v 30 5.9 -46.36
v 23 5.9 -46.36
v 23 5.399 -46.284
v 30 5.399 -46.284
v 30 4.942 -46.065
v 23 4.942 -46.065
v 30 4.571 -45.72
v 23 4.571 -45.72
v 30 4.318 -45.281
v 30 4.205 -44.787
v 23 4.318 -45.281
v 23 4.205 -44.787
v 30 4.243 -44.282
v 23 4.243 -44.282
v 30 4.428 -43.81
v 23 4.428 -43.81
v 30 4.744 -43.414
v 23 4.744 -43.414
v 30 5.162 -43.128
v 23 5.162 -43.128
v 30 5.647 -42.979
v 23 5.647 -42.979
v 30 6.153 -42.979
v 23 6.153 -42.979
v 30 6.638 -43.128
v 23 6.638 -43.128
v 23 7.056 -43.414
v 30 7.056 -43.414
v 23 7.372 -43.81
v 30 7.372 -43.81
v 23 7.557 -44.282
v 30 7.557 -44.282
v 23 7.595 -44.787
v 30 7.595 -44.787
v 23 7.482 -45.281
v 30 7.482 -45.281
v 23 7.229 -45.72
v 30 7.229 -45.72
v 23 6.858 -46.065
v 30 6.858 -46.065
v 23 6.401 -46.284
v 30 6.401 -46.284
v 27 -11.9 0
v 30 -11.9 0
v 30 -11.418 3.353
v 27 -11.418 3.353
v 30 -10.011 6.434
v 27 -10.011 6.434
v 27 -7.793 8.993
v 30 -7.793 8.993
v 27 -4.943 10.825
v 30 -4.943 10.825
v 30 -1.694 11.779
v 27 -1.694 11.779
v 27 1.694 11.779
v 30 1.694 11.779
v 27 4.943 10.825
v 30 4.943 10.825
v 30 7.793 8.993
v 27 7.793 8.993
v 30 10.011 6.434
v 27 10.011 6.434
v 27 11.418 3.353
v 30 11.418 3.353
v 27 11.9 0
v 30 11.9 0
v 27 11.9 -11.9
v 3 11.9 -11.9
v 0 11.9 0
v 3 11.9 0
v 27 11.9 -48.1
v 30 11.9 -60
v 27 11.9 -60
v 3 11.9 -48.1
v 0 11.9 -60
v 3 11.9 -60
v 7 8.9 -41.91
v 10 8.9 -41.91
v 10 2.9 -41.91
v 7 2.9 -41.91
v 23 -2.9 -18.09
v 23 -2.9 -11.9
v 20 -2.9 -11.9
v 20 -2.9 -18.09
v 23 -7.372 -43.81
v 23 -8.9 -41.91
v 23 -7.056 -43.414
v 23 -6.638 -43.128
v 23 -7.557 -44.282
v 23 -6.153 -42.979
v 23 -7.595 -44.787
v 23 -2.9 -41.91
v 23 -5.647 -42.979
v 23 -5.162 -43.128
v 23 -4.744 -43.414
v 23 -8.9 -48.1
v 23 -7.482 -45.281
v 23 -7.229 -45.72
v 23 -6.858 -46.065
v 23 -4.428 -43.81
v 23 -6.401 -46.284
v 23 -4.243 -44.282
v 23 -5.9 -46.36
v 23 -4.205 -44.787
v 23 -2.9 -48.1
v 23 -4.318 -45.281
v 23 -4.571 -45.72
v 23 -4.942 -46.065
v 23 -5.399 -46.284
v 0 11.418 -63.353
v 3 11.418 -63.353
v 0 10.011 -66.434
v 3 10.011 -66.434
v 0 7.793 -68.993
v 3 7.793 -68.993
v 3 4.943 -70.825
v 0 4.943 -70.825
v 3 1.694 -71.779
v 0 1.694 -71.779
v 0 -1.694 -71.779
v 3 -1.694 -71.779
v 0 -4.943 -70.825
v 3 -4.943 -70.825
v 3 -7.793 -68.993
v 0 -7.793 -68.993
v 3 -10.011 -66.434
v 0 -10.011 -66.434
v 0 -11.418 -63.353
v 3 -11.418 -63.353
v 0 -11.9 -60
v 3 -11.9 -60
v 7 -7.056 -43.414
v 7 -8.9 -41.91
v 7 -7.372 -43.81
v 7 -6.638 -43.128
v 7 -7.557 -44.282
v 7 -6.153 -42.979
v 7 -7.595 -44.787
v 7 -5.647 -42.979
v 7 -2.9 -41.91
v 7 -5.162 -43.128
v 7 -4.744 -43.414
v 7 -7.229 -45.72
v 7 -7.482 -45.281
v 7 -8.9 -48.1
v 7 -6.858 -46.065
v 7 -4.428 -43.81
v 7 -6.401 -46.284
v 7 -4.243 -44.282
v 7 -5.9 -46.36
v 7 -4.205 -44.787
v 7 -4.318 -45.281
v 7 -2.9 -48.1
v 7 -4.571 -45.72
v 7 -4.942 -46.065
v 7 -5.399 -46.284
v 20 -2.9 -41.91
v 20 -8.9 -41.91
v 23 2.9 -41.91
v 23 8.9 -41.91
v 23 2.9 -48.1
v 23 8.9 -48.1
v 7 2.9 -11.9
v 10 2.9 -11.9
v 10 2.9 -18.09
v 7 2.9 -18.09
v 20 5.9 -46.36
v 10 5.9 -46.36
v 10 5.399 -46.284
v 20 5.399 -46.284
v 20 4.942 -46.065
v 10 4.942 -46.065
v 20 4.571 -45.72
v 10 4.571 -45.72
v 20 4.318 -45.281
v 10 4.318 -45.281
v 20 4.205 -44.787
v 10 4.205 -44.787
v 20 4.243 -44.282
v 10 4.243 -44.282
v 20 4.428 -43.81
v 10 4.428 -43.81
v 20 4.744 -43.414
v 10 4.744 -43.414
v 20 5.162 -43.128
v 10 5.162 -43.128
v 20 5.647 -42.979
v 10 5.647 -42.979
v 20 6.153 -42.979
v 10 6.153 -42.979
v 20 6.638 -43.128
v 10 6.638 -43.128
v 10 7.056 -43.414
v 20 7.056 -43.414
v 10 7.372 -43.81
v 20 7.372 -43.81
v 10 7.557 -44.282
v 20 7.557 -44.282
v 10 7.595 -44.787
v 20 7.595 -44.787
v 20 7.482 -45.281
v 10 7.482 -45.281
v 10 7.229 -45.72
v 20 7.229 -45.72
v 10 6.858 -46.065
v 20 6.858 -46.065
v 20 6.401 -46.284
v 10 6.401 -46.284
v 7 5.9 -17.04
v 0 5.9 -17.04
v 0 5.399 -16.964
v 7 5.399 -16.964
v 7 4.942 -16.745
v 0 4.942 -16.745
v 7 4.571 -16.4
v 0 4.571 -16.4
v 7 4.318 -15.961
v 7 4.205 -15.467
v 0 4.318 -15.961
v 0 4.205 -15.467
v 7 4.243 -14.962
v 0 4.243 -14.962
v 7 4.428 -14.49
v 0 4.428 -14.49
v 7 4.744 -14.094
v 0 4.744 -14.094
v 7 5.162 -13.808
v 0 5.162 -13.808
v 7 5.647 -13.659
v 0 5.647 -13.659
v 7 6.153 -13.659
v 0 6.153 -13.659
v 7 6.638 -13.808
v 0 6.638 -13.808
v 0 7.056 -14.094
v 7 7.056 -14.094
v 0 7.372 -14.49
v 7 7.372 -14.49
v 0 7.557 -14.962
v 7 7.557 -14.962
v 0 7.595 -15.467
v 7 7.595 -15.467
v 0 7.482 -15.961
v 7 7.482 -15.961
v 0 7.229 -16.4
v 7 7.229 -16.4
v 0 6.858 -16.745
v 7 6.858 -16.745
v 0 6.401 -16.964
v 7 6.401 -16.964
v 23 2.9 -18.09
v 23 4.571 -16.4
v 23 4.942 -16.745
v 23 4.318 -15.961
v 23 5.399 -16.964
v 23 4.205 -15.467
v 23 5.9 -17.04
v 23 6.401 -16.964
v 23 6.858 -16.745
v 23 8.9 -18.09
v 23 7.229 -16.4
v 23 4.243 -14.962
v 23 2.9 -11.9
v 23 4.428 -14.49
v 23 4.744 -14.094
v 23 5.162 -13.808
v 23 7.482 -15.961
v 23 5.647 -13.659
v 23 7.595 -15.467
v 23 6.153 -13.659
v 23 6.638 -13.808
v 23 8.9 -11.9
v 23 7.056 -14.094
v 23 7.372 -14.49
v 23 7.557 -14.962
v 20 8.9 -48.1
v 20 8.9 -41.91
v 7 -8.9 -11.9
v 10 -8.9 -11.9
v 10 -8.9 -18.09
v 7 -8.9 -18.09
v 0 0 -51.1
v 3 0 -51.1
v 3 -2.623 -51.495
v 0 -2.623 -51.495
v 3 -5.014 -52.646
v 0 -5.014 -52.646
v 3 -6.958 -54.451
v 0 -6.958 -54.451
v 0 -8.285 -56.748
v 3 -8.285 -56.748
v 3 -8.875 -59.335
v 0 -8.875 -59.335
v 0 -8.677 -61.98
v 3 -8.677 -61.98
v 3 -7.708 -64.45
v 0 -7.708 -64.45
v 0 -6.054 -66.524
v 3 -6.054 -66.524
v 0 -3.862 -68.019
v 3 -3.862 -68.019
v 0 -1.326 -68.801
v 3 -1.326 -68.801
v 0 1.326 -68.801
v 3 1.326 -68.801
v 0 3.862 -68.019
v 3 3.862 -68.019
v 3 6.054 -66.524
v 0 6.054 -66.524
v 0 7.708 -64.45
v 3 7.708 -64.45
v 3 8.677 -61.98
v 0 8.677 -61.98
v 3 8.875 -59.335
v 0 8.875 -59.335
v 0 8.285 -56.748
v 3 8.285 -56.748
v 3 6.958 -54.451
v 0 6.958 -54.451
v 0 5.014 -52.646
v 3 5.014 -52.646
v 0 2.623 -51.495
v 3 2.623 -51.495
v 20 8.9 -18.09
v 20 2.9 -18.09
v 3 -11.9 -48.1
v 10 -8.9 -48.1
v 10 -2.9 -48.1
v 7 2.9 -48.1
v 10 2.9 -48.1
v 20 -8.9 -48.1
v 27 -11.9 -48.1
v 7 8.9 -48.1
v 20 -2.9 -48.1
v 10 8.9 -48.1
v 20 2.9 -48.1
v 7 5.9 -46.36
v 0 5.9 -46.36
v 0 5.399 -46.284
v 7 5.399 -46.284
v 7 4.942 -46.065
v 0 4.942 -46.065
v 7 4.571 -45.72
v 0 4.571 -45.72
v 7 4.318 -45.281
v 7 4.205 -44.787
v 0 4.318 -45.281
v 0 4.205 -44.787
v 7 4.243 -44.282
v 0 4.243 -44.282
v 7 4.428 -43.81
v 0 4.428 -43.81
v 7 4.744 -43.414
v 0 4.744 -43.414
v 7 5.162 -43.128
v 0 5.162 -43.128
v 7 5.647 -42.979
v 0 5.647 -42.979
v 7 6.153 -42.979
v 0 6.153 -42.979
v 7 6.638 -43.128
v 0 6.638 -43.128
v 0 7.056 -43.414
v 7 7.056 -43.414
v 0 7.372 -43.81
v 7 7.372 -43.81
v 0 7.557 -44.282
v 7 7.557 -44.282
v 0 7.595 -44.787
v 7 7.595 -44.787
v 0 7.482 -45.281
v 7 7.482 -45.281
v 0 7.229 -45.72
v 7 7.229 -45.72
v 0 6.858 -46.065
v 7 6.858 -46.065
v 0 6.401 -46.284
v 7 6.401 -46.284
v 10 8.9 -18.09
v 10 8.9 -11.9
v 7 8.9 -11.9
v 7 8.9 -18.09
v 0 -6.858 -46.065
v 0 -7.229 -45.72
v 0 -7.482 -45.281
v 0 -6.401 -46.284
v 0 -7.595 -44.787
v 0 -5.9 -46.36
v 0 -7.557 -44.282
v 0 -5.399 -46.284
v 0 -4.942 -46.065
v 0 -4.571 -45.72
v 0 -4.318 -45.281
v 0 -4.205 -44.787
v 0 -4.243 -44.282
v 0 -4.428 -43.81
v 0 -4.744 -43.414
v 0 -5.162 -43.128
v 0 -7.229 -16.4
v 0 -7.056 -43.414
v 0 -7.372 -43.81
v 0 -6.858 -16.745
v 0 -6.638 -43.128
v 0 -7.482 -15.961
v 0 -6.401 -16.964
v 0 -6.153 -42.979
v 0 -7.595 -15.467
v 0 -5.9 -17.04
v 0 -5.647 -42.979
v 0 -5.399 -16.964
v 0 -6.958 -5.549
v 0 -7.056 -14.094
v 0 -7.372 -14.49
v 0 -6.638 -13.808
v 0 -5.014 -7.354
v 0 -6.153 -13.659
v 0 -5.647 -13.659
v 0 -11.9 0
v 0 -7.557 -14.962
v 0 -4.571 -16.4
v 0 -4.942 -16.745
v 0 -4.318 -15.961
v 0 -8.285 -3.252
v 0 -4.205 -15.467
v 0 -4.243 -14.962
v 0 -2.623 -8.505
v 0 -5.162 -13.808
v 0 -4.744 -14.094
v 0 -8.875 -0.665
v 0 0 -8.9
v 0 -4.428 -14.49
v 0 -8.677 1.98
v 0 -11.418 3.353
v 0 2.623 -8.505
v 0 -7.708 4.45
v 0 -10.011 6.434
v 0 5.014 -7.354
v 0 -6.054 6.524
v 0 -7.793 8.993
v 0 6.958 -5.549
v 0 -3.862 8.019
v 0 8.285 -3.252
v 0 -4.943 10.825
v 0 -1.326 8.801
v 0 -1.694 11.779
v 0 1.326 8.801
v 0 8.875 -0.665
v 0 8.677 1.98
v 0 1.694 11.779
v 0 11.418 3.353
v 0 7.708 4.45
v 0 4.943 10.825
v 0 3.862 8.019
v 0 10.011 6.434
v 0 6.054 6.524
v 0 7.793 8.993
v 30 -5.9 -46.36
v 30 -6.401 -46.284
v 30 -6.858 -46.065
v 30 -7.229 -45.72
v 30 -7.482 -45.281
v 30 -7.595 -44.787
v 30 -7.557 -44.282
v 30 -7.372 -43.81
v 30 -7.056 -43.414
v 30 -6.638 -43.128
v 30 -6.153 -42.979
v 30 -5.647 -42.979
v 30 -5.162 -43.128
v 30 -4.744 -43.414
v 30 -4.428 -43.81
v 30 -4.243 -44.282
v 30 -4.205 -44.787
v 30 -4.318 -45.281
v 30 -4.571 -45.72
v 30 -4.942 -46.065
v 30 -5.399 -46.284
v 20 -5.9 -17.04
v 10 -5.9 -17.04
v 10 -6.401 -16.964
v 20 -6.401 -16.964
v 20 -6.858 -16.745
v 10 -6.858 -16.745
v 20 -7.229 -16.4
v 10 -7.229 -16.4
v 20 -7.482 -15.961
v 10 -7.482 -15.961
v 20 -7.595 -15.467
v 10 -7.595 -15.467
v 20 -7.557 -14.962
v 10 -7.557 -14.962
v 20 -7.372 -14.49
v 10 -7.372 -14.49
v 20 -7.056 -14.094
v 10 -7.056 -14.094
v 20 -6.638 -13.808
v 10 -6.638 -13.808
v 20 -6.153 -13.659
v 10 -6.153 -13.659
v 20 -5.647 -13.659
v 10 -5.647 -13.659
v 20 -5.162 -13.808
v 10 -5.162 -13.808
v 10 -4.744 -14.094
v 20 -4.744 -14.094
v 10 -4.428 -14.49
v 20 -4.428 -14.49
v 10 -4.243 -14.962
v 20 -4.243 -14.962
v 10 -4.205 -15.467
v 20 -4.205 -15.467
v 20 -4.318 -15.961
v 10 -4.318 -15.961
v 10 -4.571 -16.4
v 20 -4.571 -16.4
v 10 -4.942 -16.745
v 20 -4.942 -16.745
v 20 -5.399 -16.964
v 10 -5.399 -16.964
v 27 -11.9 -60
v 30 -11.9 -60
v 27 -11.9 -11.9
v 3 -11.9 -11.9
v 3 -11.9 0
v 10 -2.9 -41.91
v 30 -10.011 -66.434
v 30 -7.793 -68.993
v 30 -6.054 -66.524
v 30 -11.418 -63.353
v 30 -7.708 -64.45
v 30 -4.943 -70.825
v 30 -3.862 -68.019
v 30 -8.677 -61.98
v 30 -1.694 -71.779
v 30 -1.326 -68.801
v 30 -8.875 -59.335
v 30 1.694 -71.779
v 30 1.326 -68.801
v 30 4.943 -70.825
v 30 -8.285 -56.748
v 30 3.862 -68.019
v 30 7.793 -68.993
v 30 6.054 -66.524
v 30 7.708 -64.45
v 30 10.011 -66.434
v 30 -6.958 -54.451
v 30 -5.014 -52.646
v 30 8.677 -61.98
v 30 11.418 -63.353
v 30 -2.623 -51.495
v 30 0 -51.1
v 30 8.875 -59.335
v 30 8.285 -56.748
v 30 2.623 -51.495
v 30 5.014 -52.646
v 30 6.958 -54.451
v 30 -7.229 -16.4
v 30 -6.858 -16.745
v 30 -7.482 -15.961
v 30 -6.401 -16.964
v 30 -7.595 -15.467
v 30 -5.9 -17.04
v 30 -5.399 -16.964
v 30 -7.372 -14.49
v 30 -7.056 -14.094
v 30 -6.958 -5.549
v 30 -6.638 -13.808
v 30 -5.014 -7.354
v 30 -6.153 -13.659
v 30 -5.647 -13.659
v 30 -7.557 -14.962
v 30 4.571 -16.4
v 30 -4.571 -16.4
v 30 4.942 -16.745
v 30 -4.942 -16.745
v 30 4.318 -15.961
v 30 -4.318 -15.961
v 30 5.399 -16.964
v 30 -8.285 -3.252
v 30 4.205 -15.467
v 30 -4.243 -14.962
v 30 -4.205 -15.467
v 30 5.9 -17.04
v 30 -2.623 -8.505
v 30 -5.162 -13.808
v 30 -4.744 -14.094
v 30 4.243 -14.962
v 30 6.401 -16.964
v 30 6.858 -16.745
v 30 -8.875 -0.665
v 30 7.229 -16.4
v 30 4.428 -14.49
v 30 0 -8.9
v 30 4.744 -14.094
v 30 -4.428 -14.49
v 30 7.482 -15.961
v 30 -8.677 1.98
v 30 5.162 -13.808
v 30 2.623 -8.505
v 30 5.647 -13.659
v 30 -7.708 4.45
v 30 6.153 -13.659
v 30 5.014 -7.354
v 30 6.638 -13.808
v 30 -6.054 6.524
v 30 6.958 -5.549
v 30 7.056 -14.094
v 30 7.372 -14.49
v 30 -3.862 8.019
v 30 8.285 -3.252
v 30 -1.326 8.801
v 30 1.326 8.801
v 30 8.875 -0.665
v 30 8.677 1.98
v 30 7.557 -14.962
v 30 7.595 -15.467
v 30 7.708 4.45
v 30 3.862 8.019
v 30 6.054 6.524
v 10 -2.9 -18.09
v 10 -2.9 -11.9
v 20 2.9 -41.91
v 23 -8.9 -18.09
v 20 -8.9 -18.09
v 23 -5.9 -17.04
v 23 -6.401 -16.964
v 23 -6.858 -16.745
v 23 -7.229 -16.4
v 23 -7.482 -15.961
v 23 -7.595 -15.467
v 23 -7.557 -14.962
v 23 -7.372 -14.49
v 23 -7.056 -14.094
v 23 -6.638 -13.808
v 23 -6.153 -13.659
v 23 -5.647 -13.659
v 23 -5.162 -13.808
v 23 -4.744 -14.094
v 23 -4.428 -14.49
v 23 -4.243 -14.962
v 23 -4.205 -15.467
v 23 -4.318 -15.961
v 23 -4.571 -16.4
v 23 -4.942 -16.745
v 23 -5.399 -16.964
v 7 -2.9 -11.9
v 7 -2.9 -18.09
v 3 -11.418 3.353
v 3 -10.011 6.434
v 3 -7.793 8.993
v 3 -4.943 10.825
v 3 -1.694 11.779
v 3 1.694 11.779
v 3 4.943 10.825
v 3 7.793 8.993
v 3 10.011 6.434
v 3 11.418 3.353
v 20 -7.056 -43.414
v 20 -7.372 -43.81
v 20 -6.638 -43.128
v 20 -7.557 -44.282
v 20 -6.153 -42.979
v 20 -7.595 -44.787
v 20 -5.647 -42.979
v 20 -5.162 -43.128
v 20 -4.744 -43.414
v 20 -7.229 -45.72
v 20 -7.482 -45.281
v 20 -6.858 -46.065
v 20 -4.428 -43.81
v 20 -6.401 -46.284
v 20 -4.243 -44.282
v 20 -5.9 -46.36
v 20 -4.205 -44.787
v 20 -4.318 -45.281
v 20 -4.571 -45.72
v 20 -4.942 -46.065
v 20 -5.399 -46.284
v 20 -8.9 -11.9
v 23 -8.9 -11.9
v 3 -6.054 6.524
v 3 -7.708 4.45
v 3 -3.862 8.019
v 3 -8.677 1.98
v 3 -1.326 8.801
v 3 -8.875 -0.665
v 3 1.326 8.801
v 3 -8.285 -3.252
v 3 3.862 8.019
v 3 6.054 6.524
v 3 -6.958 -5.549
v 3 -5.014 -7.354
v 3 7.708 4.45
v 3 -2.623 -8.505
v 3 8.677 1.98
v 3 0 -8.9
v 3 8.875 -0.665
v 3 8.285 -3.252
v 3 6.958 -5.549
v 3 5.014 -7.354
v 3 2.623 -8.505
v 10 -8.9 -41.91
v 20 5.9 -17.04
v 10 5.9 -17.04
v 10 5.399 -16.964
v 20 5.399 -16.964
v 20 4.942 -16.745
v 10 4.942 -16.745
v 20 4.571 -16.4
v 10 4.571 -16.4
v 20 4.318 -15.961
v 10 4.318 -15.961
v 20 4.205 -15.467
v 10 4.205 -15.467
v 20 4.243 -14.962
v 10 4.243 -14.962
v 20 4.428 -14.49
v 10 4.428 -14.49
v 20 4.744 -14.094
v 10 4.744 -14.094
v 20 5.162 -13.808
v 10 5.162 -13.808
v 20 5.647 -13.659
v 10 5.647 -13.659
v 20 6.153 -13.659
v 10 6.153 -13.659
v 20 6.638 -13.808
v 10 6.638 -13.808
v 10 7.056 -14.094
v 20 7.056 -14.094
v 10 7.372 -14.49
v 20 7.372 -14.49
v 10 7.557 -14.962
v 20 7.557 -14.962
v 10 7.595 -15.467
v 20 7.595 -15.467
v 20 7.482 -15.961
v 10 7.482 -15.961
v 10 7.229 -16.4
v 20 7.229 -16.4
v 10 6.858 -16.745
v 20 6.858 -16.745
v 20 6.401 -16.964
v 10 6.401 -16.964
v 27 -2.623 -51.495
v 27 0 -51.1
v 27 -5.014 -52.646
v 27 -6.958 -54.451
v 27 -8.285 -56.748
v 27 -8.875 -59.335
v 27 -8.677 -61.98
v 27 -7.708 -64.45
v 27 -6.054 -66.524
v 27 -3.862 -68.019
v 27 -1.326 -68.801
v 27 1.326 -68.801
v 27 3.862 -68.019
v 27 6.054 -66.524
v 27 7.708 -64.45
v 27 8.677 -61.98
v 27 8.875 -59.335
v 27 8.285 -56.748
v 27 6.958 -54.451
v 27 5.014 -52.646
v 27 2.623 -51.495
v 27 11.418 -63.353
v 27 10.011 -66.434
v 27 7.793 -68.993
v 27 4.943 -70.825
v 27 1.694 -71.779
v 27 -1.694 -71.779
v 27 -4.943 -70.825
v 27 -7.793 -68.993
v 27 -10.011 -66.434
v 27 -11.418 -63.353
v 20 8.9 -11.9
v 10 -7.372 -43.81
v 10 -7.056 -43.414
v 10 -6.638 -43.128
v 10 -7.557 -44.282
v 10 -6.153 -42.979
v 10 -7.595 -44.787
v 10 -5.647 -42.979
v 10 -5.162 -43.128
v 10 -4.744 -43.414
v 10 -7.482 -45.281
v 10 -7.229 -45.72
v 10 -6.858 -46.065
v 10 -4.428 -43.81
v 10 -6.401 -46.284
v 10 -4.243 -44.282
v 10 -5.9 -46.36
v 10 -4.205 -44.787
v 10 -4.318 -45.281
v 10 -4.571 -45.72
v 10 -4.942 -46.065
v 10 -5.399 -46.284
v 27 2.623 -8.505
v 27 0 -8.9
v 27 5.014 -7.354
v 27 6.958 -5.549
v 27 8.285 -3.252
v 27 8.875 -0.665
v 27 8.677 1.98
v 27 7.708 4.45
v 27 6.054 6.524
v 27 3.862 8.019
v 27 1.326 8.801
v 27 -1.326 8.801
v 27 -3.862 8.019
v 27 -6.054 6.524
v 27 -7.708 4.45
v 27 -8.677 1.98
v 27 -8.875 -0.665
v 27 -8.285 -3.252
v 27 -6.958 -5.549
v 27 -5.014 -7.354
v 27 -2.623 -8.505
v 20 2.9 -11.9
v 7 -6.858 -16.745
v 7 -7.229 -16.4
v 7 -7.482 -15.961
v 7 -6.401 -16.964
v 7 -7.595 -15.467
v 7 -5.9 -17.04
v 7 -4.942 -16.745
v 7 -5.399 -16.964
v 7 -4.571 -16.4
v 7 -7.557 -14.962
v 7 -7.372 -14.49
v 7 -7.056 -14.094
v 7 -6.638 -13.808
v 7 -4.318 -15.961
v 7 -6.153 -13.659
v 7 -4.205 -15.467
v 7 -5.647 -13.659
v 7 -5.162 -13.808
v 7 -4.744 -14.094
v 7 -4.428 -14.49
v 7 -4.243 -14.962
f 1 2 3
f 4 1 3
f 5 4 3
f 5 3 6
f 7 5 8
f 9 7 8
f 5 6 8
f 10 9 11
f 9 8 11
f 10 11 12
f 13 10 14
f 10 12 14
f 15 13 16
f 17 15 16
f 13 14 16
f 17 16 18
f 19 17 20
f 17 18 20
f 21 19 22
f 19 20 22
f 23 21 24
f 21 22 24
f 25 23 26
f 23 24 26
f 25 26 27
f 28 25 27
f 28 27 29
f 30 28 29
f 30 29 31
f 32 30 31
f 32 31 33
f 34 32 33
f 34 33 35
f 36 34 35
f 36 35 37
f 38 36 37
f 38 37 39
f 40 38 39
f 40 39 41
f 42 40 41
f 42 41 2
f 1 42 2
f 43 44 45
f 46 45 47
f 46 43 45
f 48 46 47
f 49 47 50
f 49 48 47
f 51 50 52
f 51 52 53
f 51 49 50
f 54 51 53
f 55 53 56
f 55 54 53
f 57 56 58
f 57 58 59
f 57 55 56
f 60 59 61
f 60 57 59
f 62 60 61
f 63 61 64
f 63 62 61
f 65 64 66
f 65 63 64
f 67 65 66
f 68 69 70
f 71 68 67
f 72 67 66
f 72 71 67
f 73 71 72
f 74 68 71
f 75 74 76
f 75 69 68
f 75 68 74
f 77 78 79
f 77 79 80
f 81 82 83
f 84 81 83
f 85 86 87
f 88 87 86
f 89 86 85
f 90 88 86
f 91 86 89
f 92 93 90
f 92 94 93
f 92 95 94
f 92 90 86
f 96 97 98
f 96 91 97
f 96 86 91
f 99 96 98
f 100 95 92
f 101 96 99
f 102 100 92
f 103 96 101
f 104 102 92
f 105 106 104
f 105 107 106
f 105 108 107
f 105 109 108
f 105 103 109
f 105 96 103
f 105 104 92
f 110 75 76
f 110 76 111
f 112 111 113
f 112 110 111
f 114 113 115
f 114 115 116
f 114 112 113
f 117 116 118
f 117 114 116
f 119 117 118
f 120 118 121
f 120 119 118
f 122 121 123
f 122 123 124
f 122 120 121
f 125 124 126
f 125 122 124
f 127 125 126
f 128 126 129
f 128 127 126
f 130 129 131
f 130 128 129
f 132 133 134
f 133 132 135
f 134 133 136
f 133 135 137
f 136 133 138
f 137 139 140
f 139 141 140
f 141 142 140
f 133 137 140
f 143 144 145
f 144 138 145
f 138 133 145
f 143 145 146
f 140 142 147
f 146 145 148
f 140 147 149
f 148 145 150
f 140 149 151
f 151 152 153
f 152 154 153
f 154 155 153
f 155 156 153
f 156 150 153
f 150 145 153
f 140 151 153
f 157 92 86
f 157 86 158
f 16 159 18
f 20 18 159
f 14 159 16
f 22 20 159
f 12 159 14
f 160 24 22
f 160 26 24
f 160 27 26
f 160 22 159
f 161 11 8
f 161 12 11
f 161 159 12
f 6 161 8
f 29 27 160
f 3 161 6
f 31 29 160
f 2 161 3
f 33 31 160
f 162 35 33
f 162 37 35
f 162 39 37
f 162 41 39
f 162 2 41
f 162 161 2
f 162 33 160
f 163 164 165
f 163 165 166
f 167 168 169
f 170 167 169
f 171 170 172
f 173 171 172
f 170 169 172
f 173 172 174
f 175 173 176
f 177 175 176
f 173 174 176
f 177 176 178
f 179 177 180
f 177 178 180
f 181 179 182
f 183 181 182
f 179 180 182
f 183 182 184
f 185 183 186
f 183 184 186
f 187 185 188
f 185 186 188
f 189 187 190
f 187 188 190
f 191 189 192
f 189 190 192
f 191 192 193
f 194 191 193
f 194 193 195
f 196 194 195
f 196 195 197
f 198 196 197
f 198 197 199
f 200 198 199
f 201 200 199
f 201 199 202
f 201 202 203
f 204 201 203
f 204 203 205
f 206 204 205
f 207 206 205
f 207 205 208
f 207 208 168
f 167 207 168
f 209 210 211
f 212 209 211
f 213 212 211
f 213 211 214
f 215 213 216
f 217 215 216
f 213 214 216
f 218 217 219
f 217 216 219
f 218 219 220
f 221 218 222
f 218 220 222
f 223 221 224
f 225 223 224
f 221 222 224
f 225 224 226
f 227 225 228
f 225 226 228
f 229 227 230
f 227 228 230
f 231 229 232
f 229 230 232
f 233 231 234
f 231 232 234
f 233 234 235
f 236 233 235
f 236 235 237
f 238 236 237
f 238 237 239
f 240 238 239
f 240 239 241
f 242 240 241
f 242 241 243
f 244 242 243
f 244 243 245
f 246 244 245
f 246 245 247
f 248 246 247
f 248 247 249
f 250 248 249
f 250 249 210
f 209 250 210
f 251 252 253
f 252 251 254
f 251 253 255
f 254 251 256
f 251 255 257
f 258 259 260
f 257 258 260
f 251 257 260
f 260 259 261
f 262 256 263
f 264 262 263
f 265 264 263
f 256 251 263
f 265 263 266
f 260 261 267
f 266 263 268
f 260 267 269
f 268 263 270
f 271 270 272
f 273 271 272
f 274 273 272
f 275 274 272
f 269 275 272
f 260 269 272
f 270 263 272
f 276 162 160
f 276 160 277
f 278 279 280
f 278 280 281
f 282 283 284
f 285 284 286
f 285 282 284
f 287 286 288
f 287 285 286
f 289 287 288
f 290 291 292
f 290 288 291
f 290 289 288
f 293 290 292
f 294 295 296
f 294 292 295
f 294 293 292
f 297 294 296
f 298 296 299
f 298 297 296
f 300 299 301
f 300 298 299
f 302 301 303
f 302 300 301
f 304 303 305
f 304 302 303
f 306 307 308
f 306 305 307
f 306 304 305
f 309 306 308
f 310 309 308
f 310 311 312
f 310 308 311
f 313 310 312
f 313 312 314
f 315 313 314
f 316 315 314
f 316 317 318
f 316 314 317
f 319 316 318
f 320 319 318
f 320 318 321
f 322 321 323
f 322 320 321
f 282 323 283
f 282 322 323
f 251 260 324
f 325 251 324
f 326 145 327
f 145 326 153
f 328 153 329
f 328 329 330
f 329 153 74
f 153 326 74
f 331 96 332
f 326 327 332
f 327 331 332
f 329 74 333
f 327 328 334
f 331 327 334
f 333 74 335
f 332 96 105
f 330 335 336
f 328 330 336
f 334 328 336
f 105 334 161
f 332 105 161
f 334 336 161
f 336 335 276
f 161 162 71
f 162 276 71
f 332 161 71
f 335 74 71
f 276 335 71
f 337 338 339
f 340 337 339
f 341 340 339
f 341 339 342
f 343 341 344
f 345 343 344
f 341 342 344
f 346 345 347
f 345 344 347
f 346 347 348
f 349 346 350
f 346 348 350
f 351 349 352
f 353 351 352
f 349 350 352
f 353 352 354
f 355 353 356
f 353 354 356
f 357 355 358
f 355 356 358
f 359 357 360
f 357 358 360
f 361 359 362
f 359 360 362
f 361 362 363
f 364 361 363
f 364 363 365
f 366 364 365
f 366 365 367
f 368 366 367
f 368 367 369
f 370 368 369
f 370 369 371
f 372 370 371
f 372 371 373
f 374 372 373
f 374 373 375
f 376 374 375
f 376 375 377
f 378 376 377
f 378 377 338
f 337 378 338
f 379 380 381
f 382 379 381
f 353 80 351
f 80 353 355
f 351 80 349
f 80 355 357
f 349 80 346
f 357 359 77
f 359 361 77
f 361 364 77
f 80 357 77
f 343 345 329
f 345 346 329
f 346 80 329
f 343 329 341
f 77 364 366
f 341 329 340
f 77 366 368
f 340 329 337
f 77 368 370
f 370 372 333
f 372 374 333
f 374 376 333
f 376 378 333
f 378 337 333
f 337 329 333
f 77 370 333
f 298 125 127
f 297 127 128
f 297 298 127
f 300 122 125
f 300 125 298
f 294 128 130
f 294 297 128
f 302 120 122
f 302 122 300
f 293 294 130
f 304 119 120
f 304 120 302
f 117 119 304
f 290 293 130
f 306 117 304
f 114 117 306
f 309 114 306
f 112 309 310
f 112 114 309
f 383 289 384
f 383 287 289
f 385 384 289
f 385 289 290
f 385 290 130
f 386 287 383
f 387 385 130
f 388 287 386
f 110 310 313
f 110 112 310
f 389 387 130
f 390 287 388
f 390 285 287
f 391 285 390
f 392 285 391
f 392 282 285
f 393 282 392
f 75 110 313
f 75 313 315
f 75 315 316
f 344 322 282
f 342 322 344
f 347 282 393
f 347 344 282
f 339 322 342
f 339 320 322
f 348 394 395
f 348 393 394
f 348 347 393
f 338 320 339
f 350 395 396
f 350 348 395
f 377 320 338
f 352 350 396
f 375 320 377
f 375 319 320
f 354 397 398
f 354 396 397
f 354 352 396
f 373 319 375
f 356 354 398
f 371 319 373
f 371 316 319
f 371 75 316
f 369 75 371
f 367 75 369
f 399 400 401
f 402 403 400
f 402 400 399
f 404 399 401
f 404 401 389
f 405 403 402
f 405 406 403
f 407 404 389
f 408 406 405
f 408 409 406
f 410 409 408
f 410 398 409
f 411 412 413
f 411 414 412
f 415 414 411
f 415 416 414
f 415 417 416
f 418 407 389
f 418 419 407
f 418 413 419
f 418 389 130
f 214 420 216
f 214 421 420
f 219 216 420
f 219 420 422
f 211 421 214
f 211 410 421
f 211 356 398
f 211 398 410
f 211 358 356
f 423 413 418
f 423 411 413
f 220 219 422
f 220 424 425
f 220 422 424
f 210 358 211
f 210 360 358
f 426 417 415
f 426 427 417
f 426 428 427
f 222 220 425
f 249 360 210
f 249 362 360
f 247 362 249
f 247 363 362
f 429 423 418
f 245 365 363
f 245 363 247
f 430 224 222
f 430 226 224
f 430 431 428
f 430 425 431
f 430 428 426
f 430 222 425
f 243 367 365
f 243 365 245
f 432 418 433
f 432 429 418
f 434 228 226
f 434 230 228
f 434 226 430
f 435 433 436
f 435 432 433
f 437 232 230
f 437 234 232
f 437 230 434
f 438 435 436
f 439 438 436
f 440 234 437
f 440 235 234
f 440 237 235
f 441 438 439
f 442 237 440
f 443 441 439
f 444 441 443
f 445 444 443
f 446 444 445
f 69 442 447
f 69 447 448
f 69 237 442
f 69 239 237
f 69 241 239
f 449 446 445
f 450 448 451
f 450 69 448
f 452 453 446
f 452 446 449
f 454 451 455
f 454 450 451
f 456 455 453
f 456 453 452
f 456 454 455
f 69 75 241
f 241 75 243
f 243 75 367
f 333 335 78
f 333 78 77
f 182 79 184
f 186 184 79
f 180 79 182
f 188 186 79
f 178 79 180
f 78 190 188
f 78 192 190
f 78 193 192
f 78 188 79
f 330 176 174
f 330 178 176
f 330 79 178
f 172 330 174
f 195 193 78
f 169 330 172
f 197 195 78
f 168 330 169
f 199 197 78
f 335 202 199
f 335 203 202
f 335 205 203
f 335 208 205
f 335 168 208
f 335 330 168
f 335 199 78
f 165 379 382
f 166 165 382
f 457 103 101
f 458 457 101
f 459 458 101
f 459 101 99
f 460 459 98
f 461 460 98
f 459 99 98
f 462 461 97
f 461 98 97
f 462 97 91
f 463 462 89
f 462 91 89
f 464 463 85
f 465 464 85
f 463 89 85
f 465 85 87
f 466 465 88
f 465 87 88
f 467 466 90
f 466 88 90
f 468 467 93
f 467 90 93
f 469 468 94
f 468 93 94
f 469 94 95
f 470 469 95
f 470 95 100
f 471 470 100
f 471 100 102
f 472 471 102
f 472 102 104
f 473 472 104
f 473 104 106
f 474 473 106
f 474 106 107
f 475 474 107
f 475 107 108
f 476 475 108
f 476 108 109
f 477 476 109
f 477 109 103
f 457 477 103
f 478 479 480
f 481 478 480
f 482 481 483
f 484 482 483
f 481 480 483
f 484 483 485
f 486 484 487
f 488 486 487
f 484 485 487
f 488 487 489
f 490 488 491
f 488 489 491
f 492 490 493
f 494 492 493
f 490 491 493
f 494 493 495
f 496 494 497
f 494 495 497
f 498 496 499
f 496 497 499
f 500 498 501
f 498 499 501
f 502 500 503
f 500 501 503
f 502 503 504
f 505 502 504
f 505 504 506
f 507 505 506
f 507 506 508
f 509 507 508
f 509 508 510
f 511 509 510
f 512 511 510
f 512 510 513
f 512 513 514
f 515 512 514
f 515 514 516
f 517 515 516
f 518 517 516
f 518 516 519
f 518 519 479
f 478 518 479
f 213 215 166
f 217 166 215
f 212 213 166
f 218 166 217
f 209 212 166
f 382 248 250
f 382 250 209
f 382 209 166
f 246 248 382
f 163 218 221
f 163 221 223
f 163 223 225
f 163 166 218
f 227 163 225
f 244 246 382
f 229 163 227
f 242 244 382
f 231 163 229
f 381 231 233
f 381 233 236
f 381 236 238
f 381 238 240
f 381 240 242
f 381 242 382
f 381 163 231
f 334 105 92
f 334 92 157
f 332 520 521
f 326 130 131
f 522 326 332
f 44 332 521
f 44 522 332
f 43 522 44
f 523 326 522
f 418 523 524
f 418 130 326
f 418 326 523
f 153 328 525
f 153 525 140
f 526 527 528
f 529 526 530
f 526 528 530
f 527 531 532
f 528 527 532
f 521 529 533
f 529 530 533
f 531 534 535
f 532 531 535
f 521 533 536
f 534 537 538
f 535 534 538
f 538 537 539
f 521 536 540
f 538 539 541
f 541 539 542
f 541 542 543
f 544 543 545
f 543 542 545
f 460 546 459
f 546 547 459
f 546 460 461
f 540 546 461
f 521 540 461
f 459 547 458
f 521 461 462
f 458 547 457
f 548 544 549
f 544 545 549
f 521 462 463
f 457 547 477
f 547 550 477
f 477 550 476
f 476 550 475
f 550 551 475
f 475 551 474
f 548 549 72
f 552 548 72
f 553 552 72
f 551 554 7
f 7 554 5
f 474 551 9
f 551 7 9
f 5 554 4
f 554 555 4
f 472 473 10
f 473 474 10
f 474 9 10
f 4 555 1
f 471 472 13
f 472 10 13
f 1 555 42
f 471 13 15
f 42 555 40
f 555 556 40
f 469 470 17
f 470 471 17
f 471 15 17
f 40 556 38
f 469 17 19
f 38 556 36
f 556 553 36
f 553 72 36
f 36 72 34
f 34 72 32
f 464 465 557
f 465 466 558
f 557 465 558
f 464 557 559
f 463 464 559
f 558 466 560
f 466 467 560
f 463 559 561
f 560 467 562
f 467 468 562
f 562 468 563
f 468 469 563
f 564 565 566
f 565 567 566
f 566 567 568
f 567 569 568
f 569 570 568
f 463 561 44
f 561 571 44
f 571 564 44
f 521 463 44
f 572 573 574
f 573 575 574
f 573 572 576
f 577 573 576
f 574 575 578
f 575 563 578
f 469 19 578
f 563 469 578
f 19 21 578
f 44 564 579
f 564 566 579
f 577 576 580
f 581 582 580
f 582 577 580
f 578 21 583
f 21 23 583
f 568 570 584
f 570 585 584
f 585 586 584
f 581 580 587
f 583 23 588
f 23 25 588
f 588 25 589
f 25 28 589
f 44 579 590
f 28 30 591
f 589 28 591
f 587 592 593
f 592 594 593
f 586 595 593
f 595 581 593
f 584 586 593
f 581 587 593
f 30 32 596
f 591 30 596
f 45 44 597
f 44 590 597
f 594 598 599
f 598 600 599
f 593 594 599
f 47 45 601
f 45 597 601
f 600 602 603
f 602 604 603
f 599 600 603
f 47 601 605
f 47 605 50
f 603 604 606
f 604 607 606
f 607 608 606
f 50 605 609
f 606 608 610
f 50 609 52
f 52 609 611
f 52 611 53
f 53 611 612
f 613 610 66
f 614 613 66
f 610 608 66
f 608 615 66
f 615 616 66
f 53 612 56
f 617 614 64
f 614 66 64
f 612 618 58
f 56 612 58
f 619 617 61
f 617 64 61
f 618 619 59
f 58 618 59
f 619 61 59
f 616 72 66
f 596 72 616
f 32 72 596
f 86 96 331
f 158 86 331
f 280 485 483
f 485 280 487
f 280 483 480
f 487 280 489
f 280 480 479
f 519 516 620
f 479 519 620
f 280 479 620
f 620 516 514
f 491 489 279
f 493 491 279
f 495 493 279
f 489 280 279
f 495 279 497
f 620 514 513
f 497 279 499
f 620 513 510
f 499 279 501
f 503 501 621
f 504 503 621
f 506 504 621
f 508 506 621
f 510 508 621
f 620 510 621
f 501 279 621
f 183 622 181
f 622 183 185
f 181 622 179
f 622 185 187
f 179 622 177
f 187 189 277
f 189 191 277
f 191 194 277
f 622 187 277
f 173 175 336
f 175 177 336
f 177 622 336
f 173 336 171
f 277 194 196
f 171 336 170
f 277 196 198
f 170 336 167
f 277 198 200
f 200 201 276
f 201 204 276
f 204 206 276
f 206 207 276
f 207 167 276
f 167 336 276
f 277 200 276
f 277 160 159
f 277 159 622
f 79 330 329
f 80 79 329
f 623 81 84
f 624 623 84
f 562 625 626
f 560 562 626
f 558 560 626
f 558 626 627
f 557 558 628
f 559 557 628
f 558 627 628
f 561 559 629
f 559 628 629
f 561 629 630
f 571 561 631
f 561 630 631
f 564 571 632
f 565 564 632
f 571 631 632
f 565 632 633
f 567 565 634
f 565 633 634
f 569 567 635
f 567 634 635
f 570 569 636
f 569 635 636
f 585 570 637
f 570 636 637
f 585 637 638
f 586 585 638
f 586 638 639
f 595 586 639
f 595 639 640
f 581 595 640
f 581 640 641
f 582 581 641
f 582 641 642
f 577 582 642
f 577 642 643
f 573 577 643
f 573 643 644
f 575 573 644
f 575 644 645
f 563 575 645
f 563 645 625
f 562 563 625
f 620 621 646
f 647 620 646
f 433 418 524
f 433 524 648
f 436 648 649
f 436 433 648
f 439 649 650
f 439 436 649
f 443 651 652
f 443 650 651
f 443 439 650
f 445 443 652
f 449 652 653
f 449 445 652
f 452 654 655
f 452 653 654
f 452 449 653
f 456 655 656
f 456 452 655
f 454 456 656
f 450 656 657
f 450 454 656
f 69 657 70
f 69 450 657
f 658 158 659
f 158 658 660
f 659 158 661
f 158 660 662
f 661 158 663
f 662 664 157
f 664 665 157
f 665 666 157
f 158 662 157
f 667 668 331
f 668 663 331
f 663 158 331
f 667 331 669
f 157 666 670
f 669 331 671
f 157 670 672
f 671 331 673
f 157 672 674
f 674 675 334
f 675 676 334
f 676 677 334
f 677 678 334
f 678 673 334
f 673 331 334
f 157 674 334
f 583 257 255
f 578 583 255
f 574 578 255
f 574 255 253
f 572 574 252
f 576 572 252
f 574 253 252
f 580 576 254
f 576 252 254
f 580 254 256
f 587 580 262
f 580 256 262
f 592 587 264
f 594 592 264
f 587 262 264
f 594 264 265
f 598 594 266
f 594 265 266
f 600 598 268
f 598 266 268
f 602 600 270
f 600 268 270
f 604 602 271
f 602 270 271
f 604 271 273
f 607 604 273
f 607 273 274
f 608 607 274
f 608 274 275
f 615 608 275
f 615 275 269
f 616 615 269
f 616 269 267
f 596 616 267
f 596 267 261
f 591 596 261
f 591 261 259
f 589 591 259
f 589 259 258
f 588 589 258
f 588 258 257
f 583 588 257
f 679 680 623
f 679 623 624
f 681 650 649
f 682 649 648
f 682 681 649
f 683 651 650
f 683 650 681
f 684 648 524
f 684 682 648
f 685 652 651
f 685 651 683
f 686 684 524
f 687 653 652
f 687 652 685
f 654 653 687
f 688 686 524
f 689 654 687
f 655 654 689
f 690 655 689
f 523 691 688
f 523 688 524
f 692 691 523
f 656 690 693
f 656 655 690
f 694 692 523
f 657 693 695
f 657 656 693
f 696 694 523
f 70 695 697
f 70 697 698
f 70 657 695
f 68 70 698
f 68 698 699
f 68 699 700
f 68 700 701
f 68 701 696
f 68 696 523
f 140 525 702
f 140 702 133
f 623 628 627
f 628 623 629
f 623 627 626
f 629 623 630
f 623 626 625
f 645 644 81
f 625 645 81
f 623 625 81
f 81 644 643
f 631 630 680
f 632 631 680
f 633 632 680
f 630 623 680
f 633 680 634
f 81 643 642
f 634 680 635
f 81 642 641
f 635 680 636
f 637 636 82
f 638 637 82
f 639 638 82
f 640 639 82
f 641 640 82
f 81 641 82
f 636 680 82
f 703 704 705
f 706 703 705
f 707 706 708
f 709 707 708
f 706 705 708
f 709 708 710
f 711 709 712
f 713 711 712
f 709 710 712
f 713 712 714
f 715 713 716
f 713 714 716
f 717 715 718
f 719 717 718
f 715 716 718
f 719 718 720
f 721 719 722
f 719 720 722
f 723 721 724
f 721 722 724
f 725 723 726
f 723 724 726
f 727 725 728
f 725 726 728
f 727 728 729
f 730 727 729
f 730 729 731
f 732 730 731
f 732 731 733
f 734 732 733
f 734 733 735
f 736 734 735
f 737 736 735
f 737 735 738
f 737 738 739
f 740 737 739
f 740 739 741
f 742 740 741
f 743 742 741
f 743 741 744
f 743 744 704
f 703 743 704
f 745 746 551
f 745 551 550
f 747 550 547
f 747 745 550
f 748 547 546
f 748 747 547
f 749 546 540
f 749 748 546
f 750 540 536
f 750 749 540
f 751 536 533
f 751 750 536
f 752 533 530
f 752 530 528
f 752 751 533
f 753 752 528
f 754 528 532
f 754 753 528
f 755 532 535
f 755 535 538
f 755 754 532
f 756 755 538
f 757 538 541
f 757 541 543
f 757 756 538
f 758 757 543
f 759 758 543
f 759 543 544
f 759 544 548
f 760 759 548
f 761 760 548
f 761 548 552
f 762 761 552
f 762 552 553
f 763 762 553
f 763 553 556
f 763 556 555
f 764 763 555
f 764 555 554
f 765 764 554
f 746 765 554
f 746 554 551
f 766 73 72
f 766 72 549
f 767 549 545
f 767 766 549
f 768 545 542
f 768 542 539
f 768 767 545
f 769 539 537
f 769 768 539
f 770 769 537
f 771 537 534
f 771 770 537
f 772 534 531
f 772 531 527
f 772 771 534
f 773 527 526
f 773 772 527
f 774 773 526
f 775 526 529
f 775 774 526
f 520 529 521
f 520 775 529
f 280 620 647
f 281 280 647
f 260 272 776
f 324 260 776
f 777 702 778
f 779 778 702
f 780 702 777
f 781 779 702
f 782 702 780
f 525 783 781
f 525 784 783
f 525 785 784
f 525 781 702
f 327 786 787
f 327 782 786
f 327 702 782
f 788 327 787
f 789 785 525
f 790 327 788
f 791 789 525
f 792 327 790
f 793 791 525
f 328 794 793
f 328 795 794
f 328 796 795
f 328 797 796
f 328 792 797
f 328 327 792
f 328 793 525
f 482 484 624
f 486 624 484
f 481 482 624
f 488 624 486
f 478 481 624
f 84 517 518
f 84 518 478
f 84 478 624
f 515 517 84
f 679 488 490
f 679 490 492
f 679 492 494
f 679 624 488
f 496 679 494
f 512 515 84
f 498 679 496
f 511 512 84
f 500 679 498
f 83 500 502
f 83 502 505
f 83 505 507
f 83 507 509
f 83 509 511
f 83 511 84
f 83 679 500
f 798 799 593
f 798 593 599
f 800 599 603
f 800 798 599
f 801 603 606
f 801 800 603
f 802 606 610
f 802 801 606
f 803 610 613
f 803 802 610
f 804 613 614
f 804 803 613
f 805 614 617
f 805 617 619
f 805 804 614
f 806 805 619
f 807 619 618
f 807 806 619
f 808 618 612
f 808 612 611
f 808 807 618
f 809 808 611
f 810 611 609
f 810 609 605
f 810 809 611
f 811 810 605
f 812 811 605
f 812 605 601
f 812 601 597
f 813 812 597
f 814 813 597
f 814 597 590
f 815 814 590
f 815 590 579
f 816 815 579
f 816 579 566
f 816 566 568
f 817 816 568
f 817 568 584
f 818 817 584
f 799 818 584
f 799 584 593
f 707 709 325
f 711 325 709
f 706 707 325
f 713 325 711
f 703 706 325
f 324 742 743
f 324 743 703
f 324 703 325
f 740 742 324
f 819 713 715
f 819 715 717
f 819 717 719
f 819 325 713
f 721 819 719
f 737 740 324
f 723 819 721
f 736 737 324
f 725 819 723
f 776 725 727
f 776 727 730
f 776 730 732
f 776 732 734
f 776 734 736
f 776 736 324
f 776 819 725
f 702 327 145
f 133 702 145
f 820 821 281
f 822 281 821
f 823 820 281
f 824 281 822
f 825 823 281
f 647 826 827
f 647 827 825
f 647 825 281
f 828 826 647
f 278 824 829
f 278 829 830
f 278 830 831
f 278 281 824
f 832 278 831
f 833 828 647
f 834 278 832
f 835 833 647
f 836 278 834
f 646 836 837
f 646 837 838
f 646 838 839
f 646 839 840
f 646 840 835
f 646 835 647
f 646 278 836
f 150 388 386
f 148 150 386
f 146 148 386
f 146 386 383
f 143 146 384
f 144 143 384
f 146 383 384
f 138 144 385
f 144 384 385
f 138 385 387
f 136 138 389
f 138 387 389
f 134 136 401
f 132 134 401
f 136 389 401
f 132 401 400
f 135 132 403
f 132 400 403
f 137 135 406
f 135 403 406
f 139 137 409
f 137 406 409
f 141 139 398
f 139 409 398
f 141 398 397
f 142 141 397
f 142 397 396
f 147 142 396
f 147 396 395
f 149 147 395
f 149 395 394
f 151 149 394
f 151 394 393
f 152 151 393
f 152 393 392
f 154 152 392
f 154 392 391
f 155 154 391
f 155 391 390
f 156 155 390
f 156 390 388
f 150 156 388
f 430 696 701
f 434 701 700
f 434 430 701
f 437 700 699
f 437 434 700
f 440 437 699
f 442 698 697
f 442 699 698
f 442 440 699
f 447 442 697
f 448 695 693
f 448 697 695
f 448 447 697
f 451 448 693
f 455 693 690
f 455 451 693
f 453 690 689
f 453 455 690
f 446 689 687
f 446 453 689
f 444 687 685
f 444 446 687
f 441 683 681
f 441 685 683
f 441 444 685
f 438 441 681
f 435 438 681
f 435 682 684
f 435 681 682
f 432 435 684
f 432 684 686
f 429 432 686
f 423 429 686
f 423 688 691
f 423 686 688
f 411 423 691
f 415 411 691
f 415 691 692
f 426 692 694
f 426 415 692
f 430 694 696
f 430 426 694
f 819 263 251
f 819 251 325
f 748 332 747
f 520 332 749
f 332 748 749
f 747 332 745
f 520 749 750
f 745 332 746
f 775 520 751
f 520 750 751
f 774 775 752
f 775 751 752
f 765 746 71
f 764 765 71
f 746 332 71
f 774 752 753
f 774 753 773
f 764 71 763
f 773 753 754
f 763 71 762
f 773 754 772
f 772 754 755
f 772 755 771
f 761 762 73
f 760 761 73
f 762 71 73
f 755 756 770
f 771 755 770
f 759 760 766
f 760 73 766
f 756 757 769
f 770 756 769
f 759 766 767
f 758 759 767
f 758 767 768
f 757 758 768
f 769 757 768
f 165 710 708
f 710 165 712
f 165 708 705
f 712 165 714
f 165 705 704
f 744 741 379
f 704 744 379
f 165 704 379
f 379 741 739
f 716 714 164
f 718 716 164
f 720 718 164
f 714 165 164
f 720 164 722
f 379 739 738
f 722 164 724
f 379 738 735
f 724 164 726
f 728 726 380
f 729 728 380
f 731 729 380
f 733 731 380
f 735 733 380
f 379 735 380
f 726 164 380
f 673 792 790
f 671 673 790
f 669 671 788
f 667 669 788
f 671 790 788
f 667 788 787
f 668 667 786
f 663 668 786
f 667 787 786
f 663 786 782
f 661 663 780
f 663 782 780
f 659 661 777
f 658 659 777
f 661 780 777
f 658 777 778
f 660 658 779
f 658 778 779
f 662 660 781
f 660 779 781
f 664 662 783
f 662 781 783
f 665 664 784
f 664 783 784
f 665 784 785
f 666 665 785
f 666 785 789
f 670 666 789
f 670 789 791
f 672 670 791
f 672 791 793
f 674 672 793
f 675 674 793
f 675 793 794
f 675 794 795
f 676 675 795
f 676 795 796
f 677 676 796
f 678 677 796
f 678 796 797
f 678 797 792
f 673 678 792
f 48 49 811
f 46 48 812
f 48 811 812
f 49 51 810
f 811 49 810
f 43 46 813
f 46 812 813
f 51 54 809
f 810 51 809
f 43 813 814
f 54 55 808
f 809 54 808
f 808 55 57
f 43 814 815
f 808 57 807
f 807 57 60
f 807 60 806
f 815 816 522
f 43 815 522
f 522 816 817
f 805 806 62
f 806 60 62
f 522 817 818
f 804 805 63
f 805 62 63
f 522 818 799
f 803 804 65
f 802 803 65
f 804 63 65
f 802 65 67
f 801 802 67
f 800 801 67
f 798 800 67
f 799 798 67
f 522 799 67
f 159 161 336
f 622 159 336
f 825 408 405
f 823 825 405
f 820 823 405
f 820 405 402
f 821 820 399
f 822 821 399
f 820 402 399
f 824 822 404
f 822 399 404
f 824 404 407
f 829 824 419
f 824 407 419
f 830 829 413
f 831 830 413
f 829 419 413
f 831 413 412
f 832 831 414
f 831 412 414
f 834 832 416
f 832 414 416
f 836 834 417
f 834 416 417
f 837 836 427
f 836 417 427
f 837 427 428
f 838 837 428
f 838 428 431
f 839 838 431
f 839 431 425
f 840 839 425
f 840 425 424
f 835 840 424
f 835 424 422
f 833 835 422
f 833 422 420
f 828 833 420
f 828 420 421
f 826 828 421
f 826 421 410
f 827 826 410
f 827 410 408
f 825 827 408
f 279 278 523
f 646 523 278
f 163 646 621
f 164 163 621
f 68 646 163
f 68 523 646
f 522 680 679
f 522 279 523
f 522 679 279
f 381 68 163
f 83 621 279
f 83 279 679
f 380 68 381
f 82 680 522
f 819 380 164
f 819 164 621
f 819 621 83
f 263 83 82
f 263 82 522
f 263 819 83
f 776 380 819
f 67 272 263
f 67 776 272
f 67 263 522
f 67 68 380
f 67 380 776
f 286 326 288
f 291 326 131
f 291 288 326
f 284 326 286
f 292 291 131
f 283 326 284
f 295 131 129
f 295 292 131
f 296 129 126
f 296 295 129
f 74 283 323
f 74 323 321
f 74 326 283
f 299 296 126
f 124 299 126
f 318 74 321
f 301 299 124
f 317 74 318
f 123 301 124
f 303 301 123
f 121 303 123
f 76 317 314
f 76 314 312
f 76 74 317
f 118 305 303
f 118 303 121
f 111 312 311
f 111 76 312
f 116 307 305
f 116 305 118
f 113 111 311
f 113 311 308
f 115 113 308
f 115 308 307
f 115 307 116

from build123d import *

# Parameters (mm, degrees)
SKETCH1_R            = 8.9
BOSS_EXTRUDE1_DEPTH  = 30
SKETCH2_W            = 24
SKETCH2_H            = 23.8
CUT_EXTRUDE1_DEPTH   = 82.46195431
M3_CLEARANCE_HOLE1_D = 3.4
SKETCH4_W            = 3
SKETCH4_H            = 6
CUT_EXTRUDE2_DEPTH   = 6.19


with BuildPart() as part:
    # Sketch1 → Boss-Extrude1 (new body)
    with BuildSketch(Plane(origin=(0, 0, 0), x_dir=(0, 0, -1), z_dir=(1, 0, 0))):
        with BuildLine():
            Line((0, 11.9), (60, 11.9))
            ThreePointArc((60, 11.9), (71.9, 0), (60, -11.9))
            Line((60, -11.9), (0, -11.9))
            ThreePointArc((0, -11.9), (-11.9, 0), (0, 11.9))
        make_face()
        Circle(SKETCH1_R, mode=Mode.SUBTRACT)
        with Locations(Location((60, 0, 0), (0, 0, 180))):
            Circle(SKETCH1_R, mode=Mode.SUBTRACT)
    extrude(amount=BOSS_EXTRUDE1_DEPTH)

    # Sketch2 → Cut-Extrude1 (cut, through all)
    with BuildSketch(Plane(origin=(0, 11.9, 0), x_dir=(1, 0, 0), z_dir=(0, 1, 0))):
        with Locations((15, 0)):
            Rectangle(SKETCH2_W, SKETCH2_H)
        with Locations((15, 60)):
            Rectangle(SKETCH2_W, SKETCH2_H)
    extrude(amount=-CUT_EXTRUDE1_DEPTH, mode=Mode.SUBTRACT)

    # M3 Clearance Hole1 (through all)
    with Locations(Plane(origin=(30, -5.9, -15.34), x_dir=(0, 0, 1), z_dir=(1, 0, 0))):
        with Locations((0, 0), (0, -11.8), (-29.32, -11.8), (-29.32, 0)):
            Hole(M3_CLEARANCE_HOLE1_D / 2)

    # Sketch4 → Cut-Extrude2 (cut)
    with BuildSketch(Plane(origin=(0, 0, -48.1), x_dir=(-1, 0, 0), z_dir=(0, 0, -1))):
        with Locations((-21.5, -5.9)):
            Rectangle(SKETCH4_W, SKETCH4_H)
        with Locations((-21.5, 5.9)):
            Rectangle(SKETCH4_W, SKETCH4_H)
        with Locations((-8.5, -5.9)):
            Rectangle(SKETCH4_W, SKETCH4_H)
        with Locations((-8.5, 5.9)):
            Rectangle(SKETCH4_W, SKETCH4_H)
    cut_extrude2 = extrude(amount=-CUT_EXTRUDE2_DEPTH, mode=Mode.SUBTRACT)

    # Mirror1: Cut-Extrude2 across plane
    add(cut_extrude2.mirror(Plane.XY.offset(-30)), mode=Mode.SUBTRACT)


solid = part.part
